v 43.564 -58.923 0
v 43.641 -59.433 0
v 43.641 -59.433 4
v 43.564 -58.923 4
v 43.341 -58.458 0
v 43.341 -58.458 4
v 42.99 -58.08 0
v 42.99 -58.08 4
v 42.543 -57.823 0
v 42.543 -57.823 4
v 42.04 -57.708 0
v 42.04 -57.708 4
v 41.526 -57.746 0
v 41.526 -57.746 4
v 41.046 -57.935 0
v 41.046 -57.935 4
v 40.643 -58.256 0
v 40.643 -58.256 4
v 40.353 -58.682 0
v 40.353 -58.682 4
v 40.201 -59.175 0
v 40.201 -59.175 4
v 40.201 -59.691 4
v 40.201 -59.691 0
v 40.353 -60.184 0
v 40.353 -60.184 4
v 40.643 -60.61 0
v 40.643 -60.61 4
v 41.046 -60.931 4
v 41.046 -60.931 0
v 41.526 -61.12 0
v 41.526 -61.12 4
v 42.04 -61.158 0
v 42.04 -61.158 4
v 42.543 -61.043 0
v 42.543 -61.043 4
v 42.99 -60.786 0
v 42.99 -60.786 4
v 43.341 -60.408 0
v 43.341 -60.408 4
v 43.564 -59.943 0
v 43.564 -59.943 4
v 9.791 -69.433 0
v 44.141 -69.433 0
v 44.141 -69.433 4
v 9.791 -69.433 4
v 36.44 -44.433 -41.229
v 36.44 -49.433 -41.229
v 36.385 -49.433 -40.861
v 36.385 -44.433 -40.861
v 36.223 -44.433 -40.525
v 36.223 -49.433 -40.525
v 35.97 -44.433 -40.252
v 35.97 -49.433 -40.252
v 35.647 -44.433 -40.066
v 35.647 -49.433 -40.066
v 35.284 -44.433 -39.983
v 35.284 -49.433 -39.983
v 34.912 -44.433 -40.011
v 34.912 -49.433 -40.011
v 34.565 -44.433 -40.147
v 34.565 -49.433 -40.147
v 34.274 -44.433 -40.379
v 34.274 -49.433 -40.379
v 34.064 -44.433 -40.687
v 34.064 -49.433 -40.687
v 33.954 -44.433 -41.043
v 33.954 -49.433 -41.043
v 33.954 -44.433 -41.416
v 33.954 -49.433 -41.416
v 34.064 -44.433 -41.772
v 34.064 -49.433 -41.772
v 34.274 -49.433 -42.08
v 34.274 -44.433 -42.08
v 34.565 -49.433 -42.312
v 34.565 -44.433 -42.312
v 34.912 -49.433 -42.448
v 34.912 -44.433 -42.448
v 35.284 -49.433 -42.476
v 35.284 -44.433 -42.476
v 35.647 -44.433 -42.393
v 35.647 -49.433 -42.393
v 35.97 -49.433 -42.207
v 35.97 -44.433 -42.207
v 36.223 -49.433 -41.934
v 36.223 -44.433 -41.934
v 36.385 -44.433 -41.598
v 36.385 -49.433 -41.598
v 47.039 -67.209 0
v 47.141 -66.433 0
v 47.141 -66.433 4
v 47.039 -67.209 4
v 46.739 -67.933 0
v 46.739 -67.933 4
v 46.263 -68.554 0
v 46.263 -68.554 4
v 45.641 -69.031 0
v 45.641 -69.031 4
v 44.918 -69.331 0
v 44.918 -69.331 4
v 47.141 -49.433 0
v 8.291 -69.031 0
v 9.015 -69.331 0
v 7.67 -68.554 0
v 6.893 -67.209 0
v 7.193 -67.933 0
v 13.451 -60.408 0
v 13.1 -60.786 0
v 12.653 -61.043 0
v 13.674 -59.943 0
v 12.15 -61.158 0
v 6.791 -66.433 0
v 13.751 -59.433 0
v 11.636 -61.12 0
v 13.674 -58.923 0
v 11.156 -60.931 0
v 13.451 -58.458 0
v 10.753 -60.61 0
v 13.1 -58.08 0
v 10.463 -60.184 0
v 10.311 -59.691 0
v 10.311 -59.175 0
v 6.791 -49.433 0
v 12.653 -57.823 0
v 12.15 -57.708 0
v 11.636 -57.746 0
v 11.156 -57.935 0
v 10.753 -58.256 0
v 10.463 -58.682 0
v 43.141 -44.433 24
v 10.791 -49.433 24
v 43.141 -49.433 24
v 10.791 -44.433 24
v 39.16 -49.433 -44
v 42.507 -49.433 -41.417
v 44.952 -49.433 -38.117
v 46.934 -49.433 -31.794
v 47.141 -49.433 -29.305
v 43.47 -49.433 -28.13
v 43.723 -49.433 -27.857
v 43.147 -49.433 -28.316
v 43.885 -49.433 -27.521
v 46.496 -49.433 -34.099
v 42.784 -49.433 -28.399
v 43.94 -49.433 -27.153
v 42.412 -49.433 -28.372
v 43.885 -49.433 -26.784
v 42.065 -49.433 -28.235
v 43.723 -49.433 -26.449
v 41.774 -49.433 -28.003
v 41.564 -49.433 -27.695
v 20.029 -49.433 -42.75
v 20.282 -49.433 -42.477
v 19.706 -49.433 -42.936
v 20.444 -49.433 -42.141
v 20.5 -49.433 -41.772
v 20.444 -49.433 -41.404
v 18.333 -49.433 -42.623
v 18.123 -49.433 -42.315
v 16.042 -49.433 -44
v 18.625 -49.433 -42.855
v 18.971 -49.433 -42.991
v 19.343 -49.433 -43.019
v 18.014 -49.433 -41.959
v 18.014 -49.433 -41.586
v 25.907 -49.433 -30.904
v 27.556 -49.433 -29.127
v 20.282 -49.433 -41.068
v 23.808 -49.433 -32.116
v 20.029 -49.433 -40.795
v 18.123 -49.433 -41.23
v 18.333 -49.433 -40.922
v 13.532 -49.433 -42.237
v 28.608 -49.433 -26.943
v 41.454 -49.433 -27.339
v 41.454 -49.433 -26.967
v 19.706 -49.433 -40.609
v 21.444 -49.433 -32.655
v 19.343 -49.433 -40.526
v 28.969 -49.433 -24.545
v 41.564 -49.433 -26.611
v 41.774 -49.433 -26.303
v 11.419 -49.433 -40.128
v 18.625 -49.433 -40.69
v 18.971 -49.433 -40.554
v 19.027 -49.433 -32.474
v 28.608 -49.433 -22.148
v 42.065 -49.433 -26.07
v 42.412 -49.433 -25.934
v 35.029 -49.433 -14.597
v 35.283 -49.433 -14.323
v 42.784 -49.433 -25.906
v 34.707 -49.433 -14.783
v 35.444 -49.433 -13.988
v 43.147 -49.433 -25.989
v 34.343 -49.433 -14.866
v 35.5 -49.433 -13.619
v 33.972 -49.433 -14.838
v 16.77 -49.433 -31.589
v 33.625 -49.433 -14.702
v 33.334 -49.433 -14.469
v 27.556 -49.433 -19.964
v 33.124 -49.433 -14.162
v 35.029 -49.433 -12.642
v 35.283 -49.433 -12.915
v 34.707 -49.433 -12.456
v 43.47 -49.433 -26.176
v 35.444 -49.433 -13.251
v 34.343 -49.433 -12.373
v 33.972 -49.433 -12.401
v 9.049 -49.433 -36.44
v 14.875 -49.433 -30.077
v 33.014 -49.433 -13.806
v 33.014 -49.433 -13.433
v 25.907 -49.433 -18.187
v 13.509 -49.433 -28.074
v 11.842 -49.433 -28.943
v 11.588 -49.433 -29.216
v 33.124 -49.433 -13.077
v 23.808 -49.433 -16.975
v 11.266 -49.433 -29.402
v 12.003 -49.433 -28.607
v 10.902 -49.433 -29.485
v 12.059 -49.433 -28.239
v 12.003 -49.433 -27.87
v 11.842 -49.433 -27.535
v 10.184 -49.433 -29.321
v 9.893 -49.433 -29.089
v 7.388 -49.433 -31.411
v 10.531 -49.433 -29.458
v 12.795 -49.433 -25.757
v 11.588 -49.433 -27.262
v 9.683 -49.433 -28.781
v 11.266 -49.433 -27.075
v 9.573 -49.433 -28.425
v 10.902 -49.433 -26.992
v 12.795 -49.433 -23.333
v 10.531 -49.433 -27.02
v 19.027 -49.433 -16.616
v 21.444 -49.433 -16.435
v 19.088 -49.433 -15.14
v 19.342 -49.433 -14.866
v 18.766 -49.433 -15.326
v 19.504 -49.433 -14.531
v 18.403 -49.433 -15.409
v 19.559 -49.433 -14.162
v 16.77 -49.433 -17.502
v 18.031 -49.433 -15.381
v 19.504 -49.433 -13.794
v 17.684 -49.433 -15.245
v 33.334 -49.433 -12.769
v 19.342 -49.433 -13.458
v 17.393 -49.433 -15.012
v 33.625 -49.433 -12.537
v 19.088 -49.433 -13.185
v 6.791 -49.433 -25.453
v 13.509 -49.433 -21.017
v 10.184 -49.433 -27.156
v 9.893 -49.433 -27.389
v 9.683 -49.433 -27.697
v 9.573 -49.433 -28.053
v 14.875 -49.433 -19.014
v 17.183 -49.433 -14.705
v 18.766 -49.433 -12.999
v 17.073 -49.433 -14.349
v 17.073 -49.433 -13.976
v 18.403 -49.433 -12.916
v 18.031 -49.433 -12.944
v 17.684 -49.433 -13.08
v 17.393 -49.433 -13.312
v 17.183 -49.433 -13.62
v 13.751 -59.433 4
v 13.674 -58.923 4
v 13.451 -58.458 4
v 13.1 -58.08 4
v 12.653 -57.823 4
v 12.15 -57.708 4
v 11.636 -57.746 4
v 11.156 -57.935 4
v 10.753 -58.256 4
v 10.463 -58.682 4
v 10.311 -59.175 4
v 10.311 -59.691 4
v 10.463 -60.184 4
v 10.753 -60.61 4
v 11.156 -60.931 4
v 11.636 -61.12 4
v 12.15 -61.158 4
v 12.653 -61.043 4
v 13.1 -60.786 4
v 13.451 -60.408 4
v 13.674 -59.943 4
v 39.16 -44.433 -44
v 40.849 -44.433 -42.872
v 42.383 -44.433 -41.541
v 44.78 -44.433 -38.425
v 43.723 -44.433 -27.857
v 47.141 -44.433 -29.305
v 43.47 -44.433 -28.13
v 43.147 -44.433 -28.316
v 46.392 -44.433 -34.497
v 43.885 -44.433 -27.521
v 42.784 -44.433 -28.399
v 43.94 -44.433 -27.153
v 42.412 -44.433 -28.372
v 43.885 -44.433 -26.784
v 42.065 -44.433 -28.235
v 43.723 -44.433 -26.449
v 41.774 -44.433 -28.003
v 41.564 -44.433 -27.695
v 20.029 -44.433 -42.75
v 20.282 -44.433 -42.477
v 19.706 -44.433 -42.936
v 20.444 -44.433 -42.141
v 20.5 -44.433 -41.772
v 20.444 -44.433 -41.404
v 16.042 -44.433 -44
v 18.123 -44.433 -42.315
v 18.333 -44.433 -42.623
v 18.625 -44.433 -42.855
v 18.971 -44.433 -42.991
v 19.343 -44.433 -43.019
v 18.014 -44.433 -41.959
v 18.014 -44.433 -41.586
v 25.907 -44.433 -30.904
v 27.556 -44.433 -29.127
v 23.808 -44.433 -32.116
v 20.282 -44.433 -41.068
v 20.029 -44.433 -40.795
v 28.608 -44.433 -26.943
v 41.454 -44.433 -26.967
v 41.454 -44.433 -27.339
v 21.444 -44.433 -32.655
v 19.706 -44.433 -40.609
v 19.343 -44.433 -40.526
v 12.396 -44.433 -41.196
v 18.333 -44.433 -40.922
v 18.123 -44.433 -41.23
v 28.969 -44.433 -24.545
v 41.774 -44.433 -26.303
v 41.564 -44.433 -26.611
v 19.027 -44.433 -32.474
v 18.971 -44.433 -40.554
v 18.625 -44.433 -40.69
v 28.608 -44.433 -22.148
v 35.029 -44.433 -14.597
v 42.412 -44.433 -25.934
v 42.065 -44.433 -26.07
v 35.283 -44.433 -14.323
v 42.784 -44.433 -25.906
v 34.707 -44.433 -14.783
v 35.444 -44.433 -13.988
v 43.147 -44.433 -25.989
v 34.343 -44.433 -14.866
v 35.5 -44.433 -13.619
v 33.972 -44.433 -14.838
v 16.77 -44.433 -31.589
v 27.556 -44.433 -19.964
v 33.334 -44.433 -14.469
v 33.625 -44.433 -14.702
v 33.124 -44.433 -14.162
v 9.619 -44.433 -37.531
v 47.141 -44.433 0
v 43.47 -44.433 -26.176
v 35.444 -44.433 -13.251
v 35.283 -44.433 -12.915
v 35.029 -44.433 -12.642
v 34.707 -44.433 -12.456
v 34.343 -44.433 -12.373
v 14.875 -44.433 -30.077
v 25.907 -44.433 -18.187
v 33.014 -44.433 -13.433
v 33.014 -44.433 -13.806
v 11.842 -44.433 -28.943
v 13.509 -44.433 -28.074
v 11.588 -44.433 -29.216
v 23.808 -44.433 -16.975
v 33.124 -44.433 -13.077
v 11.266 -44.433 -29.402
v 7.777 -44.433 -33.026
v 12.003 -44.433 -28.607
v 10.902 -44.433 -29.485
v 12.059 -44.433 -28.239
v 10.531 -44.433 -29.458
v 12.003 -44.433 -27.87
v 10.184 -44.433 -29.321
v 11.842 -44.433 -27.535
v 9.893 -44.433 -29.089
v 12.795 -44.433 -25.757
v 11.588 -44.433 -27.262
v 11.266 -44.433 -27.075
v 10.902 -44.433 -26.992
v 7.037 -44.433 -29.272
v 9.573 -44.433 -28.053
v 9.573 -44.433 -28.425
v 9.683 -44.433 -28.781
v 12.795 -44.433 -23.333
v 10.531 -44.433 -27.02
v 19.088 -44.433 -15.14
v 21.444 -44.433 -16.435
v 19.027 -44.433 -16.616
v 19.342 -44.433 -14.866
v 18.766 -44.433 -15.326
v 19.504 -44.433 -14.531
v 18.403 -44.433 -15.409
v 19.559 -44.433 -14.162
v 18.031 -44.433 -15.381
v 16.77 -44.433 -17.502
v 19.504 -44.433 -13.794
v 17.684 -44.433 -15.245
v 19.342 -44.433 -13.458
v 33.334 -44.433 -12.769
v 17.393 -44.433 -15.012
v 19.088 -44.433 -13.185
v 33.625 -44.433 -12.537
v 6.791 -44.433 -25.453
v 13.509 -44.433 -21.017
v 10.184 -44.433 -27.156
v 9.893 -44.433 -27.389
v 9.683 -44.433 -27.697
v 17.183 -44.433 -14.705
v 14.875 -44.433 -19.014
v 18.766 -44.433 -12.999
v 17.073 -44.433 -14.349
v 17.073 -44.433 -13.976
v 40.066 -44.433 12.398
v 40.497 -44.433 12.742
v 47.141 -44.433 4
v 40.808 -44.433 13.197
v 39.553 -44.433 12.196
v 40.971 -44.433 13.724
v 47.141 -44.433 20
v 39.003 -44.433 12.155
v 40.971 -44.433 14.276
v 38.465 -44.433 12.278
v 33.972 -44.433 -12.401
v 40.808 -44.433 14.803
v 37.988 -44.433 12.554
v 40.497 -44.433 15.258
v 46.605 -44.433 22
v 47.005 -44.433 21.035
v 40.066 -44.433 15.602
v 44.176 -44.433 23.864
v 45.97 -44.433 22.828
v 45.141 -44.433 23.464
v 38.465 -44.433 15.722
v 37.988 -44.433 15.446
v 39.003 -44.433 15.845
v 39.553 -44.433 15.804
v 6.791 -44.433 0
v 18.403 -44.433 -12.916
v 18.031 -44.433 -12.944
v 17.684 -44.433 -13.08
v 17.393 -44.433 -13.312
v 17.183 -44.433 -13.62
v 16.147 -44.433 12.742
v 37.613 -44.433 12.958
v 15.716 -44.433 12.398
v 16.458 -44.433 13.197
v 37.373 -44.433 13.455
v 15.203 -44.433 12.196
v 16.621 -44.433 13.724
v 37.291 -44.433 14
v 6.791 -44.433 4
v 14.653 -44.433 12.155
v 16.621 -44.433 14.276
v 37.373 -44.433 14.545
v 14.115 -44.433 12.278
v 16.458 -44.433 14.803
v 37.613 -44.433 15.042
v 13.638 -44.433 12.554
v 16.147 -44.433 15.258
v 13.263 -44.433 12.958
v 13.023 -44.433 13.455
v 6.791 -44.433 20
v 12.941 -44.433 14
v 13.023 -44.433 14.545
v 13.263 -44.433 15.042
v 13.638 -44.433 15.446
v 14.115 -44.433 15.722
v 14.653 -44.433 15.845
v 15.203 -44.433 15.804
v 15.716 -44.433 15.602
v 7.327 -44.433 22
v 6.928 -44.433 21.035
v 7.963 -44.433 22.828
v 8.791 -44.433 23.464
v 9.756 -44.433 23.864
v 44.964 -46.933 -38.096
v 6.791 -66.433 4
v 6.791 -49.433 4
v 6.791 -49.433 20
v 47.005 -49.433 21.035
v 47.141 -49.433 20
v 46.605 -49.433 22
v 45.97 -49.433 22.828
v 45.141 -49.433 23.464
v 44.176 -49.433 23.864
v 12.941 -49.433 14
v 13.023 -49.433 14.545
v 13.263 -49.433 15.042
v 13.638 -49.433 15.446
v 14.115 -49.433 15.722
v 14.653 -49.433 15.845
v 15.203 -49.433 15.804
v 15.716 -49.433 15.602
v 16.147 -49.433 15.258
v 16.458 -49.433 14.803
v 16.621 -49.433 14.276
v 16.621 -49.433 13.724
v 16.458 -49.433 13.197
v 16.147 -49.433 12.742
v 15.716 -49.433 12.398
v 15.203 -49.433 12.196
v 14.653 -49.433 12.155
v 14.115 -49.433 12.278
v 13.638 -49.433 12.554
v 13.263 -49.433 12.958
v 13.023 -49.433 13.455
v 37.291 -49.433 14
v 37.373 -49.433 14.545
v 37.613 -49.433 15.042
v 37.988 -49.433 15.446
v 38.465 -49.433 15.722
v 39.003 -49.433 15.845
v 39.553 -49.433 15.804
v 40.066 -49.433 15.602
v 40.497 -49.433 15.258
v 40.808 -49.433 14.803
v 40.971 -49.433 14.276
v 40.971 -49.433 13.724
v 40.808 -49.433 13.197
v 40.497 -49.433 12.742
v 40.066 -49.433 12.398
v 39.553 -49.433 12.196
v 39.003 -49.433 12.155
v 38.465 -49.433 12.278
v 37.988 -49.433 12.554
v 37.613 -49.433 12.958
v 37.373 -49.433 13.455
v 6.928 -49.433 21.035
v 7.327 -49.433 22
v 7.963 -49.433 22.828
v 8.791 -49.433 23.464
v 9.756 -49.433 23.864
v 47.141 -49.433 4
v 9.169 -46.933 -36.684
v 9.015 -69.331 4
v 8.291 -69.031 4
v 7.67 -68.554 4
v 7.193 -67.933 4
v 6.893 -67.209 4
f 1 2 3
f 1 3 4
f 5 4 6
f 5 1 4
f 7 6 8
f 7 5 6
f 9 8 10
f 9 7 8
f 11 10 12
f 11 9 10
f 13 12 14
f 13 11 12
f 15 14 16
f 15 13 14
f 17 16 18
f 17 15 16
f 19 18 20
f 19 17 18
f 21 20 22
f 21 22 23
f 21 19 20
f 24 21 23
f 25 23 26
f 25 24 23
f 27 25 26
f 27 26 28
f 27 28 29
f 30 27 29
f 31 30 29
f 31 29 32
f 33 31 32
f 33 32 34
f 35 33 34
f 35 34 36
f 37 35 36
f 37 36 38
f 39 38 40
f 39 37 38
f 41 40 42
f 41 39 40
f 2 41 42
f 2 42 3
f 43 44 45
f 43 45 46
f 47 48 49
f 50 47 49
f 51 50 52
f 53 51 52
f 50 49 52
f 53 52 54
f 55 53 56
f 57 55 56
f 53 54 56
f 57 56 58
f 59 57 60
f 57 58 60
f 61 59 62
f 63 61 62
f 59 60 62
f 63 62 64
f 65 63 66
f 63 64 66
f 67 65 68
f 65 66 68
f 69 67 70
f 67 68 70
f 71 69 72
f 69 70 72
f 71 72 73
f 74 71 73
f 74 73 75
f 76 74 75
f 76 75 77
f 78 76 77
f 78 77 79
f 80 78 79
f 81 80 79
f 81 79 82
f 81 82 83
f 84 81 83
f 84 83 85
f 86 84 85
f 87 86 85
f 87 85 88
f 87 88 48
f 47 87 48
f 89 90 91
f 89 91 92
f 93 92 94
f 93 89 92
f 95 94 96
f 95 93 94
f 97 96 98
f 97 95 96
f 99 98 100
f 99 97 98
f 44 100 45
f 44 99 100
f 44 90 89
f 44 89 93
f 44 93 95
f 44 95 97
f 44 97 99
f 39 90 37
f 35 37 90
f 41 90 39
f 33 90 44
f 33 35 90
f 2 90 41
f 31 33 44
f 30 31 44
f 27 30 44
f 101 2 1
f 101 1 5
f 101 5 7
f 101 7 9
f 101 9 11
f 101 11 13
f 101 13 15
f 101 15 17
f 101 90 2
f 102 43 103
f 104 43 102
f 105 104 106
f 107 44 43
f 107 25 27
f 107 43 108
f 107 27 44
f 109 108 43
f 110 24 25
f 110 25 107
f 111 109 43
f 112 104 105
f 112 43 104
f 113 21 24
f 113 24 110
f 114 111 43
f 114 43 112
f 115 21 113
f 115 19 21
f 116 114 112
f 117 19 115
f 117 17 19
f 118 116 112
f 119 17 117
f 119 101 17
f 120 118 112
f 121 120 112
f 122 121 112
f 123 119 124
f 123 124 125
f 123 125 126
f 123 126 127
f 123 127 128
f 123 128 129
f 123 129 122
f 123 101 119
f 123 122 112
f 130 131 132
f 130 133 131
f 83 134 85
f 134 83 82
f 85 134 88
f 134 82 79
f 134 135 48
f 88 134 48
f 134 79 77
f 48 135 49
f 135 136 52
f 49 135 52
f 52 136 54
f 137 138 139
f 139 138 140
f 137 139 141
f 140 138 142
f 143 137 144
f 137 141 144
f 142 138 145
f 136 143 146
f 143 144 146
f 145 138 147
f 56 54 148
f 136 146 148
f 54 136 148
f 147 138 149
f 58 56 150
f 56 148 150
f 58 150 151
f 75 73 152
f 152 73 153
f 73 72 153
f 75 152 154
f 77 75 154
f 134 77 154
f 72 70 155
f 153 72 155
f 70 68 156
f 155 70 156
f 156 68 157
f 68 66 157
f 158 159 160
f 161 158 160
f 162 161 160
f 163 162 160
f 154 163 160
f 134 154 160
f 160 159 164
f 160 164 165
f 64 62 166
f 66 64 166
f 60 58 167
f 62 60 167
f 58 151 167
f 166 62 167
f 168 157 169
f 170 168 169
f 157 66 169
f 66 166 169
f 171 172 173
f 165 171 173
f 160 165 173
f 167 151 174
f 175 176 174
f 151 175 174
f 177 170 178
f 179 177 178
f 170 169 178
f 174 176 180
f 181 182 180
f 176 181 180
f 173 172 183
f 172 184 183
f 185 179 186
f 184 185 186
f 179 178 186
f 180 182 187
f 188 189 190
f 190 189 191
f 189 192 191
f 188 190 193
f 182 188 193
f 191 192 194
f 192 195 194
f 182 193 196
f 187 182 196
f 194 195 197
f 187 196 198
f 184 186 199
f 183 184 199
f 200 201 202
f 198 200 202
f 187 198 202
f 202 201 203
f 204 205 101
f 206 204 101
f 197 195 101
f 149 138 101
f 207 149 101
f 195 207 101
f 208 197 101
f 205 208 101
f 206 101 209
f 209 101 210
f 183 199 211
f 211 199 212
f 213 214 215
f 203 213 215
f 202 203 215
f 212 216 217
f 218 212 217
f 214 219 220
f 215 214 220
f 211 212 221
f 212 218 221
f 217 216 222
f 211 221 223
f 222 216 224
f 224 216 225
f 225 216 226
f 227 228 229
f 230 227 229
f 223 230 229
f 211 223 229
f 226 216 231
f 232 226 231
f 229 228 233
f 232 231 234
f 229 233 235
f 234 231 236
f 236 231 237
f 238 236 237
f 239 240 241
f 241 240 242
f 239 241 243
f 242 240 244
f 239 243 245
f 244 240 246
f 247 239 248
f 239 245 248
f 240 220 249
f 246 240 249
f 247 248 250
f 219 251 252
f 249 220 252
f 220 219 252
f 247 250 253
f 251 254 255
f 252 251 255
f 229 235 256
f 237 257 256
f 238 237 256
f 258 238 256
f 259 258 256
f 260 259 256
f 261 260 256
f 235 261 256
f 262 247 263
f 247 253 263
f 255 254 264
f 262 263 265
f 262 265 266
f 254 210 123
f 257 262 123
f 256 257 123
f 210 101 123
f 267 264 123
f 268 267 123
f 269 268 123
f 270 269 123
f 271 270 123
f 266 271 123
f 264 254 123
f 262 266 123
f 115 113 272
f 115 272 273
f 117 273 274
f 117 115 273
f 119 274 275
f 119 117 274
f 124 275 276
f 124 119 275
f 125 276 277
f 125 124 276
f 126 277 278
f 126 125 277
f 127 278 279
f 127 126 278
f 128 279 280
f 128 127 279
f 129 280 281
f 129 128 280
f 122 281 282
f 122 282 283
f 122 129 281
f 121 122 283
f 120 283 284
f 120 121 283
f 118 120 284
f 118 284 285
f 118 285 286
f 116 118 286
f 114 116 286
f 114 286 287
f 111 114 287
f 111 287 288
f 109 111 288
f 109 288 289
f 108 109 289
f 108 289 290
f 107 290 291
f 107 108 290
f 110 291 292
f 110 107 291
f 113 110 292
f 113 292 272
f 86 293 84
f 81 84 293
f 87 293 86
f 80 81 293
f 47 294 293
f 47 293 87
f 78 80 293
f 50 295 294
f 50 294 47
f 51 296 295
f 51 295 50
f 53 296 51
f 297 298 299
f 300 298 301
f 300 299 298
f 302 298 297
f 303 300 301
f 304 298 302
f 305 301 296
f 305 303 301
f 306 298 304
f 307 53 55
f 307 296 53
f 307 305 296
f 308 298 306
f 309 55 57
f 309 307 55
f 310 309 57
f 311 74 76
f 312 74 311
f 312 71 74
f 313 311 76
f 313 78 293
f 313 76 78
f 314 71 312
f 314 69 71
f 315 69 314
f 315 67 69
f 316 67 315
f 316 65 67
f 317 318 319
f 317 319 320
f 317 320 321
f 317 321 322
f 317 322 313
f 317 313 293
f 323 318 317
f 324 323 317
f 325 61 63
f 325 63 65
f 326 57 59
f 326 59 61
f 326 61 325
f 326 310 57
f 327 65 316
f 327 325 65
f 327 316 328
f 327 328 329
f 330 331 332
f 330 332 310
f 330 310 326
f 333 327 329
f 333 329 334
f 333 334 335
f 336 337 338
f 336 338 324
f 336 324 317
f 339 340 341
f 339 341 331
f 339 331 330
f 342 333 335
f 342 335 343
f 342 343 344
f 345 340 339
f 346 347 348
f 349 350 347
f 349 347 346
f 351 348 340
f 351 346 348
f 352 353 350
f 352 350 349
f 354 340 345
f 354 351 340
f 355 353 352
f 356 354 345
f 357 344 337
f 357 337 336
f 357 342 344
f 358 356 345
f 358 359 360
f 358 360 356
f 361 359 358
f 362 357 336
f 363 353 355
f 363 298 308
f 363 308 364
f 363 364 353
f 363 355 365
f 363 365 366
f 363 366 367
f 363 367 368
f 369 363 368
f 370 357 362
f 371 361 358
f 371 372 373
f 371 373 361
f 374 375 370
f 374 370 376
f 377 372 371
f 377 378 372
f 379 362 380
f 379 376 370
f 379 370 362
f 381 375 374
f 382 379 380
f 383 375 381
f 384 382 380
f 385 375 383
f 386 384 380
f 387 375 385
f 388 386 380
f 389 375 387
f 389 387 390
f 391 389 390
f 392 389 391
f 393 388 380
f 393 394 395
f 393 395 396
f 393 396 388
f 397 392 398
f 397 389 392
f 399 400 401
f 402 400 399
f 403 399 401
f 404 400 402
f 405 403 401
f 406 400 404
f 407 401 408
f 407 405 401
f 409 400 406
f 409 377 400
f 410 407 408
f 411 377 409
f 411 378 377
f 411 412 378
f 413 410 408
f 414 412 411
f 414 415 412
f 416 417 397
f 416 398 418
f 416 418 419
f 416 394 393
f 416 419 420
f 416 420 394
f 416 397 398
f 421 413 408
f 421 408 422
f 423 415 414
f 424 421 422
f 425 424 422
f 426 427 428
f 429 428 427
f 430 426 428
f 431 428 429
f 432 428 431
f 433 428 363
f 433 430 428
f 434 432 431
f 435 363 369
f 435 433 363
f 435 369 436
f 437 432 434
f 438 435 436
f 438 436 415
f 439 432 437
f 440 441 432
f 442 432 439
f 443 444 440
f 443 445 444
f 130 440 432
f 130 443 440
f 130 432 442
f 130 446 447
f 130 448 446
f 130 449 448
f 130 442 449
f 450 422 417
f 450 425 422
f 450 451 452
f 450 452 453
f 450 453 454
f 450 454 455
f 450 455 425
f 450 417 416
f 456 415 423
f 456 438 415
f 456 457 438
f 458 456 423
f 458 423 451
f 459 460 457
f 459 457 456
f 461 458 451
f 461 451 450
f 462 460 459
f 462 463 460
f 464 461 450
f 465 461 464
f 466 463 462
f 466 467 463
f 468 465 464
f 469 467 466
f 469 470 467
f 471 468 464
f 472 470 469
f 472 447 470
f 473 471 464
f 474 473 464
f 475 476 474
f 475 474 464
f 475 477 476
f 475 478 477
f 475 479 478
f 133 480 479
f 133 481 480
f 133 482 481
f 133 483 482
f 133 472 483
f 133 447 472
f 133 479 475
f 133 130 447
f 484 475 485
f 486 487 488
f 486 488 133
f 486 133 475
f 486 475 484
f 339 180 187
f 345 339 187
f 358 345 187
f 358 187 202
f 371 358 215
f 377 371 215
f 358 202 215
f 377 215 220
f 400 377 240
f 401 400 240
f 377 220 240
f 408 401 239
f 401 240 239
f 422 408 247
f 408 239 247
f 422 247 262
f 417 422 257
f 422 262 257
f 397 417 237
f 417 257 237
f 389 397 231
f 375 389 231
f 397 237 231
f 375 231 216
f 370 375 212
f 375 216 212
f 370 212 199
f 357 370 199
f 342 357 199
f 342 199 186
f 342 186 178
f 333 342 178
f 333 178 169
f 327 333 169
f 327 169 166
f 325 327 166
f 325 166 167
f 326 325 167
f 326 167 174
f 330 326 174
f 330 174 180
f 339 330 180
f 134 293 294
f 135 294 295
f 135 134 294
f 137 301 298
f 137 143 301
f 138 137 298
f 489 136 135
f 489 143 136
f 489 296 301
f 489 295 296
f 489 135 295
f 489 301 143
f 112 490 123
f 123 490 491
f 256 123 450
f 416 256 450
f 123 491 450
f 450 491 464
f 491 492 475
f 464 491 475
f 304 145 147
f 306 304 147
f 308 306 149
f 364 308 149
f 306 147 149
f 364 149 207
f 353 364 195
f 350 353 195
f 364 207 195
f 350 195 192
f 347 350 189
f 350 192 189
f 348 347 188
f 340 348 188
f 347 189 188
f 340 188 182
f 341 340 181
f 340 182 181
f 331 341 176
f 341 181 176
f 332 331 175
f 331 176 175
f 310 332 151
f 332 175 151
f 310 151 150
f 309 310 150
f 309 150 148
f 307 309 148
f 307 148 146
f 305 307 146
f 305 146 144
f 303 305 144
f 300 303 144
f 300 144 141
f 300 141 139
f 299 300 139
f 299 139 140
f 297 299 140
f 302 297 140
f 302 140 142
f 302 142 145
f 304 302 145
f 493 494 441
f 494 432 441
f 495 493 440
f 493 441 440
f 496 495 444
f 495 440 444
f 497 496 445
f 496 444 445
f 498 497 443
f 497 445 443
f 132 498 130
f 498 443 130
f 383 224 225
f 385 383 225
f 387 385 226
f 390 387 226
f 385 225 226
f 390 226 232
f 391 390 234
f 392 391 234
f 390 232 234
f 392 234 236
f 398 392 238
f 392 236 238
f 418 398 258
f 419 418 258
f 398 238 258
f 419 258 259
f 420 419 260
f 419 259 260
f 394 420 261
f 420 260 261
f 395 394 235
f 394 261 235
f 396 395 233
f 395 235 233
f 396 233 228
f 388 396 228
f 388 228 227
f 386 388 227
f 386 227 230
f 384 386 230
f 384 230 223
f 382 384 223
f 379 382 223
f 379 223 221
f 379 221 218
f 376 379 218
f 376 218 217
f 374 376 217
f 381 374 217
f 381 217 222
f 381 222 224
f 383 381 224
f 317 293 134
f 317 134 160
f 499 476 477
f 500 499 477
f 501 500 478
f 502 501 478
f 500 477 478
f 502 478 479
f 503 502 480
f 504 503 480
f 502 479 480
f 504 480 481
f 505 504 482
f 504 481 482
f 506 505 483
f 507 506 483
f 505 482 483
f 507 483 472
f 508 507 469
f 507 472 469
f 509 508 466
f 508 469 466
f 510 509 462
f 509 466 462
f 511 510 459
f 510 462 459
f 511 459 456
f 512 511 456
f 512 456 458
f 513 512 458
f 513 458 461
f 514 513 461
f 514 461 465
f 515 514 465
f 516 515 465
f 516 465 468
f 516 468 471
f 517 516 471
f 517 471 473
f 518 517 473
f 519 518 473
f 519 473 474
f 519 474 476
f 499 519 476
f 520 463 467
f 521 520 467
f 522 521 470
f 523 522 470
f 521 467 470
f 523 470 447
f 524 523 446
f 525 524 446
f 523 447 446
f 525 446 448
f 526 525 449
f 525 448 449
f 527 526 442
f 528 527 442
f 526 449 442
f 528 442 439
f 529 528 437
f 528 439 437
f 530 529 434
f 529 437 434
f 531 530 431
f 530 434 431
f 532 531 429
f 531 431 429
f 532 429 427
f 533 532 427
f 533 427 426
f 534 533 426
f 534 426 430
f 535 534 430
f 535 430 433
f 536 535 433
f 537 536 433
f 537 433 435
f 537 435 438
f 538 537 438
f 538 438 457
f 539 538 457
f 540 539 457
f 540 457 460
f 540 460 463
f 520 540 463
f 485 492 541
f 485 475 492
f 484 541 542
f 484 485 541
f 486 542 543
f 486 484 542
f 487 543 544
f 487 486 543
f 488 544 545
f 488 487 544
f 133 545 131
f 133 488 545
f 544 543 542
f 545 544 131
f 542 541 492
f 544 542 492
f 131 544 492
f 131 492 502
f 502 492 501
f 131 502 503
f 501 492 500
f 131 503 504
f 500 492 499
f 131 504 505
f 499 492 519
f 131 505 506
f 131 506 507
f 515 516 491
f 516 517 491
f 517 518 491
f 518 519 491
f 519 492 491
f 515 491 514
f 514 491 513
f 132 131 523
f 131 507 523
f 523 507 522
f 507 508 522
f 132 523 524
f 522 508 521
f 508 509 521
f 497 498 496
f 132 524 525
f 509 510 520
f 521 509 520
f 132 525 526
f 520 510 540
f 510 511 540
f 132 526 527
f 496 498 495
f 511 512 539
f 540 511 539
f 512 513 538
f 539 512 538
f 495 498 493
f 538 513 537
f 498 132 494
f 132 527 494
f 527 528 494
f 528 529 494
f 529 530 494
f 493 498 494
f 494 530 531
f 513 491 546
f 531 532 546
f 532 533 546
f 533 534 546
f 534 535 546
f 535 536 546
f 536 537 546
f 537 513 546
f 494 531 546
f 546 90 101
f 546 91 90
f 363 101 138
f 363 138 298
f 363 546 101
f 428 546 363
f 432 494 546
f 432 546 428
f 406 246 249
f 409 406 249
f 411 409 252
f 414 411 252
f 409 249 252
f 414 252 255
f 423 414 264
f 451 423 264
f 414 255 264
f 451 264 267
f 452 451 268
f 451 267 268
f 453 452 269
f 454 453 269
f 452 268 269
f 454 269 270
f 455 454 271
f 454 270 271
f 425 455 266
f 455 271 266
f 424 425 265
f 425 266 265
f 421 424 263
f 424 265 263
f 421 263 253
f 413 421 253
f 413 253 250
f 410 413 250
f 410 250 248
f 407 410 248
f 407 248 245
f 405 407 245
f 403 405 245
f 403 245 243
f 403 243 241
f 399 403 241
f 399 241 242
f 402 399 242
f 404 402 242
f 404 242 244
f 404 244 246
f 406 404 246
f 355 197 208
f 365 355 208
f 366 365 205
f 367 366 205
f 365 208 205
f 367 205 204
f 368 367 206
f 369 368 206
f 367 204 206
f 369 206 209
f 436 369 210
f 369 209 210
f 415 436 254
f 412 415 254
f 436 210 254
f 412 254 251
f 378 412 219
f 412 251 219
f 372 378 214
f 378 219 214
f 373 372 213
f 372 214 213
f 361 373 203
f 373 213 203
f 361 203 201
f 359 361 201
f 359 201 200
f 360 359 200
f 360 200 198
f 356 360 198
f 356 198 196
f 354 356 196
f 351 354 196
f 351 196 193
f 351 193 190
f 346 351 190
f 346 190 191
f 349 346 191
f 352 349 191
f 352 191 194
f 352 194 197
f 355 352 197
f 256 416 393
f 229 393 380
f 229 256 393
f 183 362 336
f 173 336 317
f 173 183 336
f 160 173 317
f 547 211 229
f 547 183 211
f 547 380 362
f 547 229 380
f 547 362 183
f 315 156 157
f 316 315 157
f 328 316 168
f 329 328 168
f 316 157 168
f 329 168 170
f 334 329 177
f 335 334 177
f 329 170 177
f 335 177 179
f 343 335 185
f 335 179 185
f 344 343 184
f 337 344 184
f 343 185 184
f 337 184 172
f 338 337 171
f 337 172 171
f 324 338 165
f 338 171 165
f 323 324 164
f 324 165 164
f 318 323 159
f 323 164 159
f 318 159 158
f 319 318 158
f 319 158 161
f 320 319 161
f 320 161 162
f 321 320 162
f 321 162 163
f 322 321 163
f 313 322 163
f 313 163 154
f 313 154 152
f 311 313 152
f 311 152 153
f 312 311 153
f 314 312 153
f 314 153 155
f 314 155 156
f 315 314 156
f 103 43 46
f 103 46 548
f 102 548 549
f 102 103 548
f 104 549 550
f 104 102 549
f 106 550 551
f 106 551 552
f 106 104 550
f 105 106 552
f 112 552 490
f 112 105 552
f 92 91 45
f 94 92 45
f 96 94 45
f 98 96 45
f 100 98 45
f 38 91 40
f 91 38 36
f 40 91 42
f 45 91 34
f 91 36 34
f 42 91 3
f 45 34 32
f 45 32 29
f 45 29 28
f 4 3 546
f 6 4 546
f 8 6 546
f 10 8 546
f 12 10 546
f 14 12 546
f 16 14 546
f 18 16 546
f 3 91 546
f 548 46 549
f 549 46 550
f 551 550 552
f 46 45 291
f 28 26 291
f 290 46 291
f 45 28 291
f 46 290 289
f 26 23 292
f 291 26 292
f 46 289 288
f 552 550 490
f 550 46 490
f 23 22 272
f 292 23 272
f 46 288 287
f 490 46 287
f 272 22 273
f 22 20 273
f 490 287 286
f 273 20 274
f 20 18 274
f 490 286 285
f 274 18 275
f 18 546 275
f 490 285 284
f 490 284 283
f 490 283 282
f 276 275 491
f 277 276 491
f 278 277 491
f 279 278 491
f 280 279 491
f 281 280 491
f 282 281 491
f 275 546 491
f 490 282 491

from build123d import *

# Parameters (mm, degrees)
SKETCH1_R           = 1.73
SKETCH1_R_2         = 1.75
BOSS_EXTRUDE1_DEPTH = 4
SKETCH2_W           = 40.35
SKETCH2_H           = 5
BOSS_EXTRUDE2_DEPTH = 20
FILLET1_R           = 4
SKETCH3_R           = 1.85
CUT_EXTRUDE1_DEPTH  = 65.55458112
SKETCH4_W           = 42.335046752
SKETCH4_H           = 40.534615669
CUT_EXTRUDE2_DEPTH  = 87.274206212
SKETCH5_W           = 40.35
SKETCH5_H           = 5
BOSS_EXTRUDE3_DEPTH = 44
SKETCH7_R           = 8.132834804
SKETCH7_R_2         = 1.25
CUT_EXTRUDE3_DEPTH  = 10


with BuildPart() as part:
    # Sketch1 → Boss-Extrude1 (new body)
    with BuildSketch(Plane.XY):
        with BuildLine():
            Line((44.141212793, -69.433023223), (9.791212793, -69.433023223))
            ThreePointArc((9.791212793, -69.433023223), (7.669892449, -68.554343566), (6.791212793, -66.433023223))
            Line((6.791212793, -66.433023223), (6.791212793, -12.433023223))
            ThreePointArc((6.791212793, -12.433023223), (8.255678887, -8.897489317), (11.791212793, -7.433023223))
            Line((11.791212793, -7.433023223), (42.141212793, -7.433023223))
            ThreePointArc((42.141212793, -7.433023223), (45.676746699, -8.897489317), (47.141212793, -12.433023223))
            Line((47.141212793, -12.433023223), (47.141212793, -66.433023223))
            ThreePointArc((47.141212793, -66.433023223), (46.262533136, -68.554343566), (44.141212793, -69.433023223))
        make_face()
        with Locations((12.021212793, -14.663023223)):
            Circle(SKETCH1_R, mode=Mode.SUBTRACT)
        with Locations((41.911212793, -14.663023223)):
            Circle(SKETCH1_R, mode=Mode.SUBTRACT)
        with Locations((12.021212793, -38.723023223)):
            Circle(SKETCH1_R_2, mode=Mode.SUBTRACT)
        with Locations((41.911212793, -38.723023223)):
            Circle(SKETCH1_R_2, mode=Mode.SUBTRACT)
        with Locations((41.911212793, -59.433023223)):
            Circle(SKETCH1_R, mode=Mode.SUBTRACT)
        with Locations((12.021212793, -59.433023223)):
            Circle(SKETCH1_R, mode=Mode.SUBTRACT)
    extrude(amount=BOSS_EXTRUDE1_DEPTH)

    # Sketch2 → Boss-Extrude2 (add)
    with BuildSketch(Plane.XY.offset(4)):
        with Locations((26.966212793, -46.933023223)):
            Rectangle(SKETCH2_W, SKETCH2_H)
    extrude(amount=BOSS_EXTRUDE2_DEPTH)

    # Fillet1
    fillet1_edges = [part.edges().sort_by_distance(p)[0] for p in [
        (6.791212793, -46.933023223, 24),
        (47.141212793, -46.933023223, 24),
    ]]
    fillet(fillet1_edges, radius=FILLET1_R)

    # Sketch3 → Cut-Extrude1 (cut, through all)
    with BuildSketch(Plane(origin=(0, -44.433023223, 0), x_dir=(1, 0, 0), z_dir=(0, 1, 0))):
        with Locations(Location((39.141212793, -14, 0), (0, 0, 180))):
            Circle(SKETCH3_R)
        with Locations(Location((14.791212793, -14, 0), (0, 0, 180))):
            Circle(SKETCH3_R)
    extrude(amount=-CUT_EXTRUDE1_DEPTH, mode=Mode.SUBTRACT)

    # Sketch4 → Cut-Extrude2 (cut, through all)
    with BuildSketch(Plane.XY.offset(4)):
        with Locations((27.958736169, -24.165715389)):
            Rectangle(SKETCH4_W, SKETCH4_H)
    extrude(amount=-CUT_EXTRUDE2_DEPTH, mode=Mode.SUBTRACT)

    # Sketch5 → Boss-Extrude3 (add)
    with BuildSketch(Plane(origin=(0, 0, 0), x_dir=(-1, 0, 0), z_dir=(0, 0, -1))):
        with Locations((-26.966212793, -46.933023223)):
            Rectangle(SKETCH5_W, SKETCH5_H)
    extrude(amount=BOSS_EXTRUDE3_DEPTH)

    # Sketch7 → Cut-Extrude3 (cut)
    with BuildSketch(Plane.XZ.offset(49.433023223)):
        with Locations((20.836658571, -24.545339617)):
            Circle(SKETCH7_R)
        with Locations((18.309091346, -14.16226231)):
            Circle(SKETCH7_R_2)
        with Locations((10.808955155, -28.238854835)):
            Circle(SKETCH7_R_2)
        with Locations((19.249573785, -41.772459571)):
            Circle(SKETCH7_R_2)
        with Locations((35.190328606, -41.229471782)):
            Circle(SKETCH7_R_2)
        with Locations((42.690464797, -27.152879257)):
            Circle(SKETCH7_R_2)
        with Locations((34.249846167, -13.619274521)):
            Circle(SKETCH7_R_2)
        with BuildLine():
            Line((6.791212793, -24.680714066), (4.582649711, -44))
            Line((4.582649711, -44), (32.677324571, -51.00034411))
            Line((32.677324571, -51.00034411), (44.945122218, -48.614200906))
            Line((44.945122218, -48.614200906), (51.549779096, -38.819864159))
            Line((51.549779096, -38.819864159), (47.141212793, -27.190260187))
            add(Edge.make_bspline(
                [(26.749709976, -47.324288879), (47.770737556, -45.874846264), (47.141212793, -27.190260187)],
                knots=[0, 0, 0, 1, 1, 1], degree=2))
            add(Edge.make_bspline(
                [(6.791212793, -24.680714066), (6.595021886, -44.867895731), (26.749709976, -47.324288879)],
                knots=[0, 0, 0, 1, 1, 1], degree=2))
        make_face()
    extrude(amount=-CUT_EXTRUDE3_DEPTH, mode=Mode.SUBTRACT)


solid = part.part
